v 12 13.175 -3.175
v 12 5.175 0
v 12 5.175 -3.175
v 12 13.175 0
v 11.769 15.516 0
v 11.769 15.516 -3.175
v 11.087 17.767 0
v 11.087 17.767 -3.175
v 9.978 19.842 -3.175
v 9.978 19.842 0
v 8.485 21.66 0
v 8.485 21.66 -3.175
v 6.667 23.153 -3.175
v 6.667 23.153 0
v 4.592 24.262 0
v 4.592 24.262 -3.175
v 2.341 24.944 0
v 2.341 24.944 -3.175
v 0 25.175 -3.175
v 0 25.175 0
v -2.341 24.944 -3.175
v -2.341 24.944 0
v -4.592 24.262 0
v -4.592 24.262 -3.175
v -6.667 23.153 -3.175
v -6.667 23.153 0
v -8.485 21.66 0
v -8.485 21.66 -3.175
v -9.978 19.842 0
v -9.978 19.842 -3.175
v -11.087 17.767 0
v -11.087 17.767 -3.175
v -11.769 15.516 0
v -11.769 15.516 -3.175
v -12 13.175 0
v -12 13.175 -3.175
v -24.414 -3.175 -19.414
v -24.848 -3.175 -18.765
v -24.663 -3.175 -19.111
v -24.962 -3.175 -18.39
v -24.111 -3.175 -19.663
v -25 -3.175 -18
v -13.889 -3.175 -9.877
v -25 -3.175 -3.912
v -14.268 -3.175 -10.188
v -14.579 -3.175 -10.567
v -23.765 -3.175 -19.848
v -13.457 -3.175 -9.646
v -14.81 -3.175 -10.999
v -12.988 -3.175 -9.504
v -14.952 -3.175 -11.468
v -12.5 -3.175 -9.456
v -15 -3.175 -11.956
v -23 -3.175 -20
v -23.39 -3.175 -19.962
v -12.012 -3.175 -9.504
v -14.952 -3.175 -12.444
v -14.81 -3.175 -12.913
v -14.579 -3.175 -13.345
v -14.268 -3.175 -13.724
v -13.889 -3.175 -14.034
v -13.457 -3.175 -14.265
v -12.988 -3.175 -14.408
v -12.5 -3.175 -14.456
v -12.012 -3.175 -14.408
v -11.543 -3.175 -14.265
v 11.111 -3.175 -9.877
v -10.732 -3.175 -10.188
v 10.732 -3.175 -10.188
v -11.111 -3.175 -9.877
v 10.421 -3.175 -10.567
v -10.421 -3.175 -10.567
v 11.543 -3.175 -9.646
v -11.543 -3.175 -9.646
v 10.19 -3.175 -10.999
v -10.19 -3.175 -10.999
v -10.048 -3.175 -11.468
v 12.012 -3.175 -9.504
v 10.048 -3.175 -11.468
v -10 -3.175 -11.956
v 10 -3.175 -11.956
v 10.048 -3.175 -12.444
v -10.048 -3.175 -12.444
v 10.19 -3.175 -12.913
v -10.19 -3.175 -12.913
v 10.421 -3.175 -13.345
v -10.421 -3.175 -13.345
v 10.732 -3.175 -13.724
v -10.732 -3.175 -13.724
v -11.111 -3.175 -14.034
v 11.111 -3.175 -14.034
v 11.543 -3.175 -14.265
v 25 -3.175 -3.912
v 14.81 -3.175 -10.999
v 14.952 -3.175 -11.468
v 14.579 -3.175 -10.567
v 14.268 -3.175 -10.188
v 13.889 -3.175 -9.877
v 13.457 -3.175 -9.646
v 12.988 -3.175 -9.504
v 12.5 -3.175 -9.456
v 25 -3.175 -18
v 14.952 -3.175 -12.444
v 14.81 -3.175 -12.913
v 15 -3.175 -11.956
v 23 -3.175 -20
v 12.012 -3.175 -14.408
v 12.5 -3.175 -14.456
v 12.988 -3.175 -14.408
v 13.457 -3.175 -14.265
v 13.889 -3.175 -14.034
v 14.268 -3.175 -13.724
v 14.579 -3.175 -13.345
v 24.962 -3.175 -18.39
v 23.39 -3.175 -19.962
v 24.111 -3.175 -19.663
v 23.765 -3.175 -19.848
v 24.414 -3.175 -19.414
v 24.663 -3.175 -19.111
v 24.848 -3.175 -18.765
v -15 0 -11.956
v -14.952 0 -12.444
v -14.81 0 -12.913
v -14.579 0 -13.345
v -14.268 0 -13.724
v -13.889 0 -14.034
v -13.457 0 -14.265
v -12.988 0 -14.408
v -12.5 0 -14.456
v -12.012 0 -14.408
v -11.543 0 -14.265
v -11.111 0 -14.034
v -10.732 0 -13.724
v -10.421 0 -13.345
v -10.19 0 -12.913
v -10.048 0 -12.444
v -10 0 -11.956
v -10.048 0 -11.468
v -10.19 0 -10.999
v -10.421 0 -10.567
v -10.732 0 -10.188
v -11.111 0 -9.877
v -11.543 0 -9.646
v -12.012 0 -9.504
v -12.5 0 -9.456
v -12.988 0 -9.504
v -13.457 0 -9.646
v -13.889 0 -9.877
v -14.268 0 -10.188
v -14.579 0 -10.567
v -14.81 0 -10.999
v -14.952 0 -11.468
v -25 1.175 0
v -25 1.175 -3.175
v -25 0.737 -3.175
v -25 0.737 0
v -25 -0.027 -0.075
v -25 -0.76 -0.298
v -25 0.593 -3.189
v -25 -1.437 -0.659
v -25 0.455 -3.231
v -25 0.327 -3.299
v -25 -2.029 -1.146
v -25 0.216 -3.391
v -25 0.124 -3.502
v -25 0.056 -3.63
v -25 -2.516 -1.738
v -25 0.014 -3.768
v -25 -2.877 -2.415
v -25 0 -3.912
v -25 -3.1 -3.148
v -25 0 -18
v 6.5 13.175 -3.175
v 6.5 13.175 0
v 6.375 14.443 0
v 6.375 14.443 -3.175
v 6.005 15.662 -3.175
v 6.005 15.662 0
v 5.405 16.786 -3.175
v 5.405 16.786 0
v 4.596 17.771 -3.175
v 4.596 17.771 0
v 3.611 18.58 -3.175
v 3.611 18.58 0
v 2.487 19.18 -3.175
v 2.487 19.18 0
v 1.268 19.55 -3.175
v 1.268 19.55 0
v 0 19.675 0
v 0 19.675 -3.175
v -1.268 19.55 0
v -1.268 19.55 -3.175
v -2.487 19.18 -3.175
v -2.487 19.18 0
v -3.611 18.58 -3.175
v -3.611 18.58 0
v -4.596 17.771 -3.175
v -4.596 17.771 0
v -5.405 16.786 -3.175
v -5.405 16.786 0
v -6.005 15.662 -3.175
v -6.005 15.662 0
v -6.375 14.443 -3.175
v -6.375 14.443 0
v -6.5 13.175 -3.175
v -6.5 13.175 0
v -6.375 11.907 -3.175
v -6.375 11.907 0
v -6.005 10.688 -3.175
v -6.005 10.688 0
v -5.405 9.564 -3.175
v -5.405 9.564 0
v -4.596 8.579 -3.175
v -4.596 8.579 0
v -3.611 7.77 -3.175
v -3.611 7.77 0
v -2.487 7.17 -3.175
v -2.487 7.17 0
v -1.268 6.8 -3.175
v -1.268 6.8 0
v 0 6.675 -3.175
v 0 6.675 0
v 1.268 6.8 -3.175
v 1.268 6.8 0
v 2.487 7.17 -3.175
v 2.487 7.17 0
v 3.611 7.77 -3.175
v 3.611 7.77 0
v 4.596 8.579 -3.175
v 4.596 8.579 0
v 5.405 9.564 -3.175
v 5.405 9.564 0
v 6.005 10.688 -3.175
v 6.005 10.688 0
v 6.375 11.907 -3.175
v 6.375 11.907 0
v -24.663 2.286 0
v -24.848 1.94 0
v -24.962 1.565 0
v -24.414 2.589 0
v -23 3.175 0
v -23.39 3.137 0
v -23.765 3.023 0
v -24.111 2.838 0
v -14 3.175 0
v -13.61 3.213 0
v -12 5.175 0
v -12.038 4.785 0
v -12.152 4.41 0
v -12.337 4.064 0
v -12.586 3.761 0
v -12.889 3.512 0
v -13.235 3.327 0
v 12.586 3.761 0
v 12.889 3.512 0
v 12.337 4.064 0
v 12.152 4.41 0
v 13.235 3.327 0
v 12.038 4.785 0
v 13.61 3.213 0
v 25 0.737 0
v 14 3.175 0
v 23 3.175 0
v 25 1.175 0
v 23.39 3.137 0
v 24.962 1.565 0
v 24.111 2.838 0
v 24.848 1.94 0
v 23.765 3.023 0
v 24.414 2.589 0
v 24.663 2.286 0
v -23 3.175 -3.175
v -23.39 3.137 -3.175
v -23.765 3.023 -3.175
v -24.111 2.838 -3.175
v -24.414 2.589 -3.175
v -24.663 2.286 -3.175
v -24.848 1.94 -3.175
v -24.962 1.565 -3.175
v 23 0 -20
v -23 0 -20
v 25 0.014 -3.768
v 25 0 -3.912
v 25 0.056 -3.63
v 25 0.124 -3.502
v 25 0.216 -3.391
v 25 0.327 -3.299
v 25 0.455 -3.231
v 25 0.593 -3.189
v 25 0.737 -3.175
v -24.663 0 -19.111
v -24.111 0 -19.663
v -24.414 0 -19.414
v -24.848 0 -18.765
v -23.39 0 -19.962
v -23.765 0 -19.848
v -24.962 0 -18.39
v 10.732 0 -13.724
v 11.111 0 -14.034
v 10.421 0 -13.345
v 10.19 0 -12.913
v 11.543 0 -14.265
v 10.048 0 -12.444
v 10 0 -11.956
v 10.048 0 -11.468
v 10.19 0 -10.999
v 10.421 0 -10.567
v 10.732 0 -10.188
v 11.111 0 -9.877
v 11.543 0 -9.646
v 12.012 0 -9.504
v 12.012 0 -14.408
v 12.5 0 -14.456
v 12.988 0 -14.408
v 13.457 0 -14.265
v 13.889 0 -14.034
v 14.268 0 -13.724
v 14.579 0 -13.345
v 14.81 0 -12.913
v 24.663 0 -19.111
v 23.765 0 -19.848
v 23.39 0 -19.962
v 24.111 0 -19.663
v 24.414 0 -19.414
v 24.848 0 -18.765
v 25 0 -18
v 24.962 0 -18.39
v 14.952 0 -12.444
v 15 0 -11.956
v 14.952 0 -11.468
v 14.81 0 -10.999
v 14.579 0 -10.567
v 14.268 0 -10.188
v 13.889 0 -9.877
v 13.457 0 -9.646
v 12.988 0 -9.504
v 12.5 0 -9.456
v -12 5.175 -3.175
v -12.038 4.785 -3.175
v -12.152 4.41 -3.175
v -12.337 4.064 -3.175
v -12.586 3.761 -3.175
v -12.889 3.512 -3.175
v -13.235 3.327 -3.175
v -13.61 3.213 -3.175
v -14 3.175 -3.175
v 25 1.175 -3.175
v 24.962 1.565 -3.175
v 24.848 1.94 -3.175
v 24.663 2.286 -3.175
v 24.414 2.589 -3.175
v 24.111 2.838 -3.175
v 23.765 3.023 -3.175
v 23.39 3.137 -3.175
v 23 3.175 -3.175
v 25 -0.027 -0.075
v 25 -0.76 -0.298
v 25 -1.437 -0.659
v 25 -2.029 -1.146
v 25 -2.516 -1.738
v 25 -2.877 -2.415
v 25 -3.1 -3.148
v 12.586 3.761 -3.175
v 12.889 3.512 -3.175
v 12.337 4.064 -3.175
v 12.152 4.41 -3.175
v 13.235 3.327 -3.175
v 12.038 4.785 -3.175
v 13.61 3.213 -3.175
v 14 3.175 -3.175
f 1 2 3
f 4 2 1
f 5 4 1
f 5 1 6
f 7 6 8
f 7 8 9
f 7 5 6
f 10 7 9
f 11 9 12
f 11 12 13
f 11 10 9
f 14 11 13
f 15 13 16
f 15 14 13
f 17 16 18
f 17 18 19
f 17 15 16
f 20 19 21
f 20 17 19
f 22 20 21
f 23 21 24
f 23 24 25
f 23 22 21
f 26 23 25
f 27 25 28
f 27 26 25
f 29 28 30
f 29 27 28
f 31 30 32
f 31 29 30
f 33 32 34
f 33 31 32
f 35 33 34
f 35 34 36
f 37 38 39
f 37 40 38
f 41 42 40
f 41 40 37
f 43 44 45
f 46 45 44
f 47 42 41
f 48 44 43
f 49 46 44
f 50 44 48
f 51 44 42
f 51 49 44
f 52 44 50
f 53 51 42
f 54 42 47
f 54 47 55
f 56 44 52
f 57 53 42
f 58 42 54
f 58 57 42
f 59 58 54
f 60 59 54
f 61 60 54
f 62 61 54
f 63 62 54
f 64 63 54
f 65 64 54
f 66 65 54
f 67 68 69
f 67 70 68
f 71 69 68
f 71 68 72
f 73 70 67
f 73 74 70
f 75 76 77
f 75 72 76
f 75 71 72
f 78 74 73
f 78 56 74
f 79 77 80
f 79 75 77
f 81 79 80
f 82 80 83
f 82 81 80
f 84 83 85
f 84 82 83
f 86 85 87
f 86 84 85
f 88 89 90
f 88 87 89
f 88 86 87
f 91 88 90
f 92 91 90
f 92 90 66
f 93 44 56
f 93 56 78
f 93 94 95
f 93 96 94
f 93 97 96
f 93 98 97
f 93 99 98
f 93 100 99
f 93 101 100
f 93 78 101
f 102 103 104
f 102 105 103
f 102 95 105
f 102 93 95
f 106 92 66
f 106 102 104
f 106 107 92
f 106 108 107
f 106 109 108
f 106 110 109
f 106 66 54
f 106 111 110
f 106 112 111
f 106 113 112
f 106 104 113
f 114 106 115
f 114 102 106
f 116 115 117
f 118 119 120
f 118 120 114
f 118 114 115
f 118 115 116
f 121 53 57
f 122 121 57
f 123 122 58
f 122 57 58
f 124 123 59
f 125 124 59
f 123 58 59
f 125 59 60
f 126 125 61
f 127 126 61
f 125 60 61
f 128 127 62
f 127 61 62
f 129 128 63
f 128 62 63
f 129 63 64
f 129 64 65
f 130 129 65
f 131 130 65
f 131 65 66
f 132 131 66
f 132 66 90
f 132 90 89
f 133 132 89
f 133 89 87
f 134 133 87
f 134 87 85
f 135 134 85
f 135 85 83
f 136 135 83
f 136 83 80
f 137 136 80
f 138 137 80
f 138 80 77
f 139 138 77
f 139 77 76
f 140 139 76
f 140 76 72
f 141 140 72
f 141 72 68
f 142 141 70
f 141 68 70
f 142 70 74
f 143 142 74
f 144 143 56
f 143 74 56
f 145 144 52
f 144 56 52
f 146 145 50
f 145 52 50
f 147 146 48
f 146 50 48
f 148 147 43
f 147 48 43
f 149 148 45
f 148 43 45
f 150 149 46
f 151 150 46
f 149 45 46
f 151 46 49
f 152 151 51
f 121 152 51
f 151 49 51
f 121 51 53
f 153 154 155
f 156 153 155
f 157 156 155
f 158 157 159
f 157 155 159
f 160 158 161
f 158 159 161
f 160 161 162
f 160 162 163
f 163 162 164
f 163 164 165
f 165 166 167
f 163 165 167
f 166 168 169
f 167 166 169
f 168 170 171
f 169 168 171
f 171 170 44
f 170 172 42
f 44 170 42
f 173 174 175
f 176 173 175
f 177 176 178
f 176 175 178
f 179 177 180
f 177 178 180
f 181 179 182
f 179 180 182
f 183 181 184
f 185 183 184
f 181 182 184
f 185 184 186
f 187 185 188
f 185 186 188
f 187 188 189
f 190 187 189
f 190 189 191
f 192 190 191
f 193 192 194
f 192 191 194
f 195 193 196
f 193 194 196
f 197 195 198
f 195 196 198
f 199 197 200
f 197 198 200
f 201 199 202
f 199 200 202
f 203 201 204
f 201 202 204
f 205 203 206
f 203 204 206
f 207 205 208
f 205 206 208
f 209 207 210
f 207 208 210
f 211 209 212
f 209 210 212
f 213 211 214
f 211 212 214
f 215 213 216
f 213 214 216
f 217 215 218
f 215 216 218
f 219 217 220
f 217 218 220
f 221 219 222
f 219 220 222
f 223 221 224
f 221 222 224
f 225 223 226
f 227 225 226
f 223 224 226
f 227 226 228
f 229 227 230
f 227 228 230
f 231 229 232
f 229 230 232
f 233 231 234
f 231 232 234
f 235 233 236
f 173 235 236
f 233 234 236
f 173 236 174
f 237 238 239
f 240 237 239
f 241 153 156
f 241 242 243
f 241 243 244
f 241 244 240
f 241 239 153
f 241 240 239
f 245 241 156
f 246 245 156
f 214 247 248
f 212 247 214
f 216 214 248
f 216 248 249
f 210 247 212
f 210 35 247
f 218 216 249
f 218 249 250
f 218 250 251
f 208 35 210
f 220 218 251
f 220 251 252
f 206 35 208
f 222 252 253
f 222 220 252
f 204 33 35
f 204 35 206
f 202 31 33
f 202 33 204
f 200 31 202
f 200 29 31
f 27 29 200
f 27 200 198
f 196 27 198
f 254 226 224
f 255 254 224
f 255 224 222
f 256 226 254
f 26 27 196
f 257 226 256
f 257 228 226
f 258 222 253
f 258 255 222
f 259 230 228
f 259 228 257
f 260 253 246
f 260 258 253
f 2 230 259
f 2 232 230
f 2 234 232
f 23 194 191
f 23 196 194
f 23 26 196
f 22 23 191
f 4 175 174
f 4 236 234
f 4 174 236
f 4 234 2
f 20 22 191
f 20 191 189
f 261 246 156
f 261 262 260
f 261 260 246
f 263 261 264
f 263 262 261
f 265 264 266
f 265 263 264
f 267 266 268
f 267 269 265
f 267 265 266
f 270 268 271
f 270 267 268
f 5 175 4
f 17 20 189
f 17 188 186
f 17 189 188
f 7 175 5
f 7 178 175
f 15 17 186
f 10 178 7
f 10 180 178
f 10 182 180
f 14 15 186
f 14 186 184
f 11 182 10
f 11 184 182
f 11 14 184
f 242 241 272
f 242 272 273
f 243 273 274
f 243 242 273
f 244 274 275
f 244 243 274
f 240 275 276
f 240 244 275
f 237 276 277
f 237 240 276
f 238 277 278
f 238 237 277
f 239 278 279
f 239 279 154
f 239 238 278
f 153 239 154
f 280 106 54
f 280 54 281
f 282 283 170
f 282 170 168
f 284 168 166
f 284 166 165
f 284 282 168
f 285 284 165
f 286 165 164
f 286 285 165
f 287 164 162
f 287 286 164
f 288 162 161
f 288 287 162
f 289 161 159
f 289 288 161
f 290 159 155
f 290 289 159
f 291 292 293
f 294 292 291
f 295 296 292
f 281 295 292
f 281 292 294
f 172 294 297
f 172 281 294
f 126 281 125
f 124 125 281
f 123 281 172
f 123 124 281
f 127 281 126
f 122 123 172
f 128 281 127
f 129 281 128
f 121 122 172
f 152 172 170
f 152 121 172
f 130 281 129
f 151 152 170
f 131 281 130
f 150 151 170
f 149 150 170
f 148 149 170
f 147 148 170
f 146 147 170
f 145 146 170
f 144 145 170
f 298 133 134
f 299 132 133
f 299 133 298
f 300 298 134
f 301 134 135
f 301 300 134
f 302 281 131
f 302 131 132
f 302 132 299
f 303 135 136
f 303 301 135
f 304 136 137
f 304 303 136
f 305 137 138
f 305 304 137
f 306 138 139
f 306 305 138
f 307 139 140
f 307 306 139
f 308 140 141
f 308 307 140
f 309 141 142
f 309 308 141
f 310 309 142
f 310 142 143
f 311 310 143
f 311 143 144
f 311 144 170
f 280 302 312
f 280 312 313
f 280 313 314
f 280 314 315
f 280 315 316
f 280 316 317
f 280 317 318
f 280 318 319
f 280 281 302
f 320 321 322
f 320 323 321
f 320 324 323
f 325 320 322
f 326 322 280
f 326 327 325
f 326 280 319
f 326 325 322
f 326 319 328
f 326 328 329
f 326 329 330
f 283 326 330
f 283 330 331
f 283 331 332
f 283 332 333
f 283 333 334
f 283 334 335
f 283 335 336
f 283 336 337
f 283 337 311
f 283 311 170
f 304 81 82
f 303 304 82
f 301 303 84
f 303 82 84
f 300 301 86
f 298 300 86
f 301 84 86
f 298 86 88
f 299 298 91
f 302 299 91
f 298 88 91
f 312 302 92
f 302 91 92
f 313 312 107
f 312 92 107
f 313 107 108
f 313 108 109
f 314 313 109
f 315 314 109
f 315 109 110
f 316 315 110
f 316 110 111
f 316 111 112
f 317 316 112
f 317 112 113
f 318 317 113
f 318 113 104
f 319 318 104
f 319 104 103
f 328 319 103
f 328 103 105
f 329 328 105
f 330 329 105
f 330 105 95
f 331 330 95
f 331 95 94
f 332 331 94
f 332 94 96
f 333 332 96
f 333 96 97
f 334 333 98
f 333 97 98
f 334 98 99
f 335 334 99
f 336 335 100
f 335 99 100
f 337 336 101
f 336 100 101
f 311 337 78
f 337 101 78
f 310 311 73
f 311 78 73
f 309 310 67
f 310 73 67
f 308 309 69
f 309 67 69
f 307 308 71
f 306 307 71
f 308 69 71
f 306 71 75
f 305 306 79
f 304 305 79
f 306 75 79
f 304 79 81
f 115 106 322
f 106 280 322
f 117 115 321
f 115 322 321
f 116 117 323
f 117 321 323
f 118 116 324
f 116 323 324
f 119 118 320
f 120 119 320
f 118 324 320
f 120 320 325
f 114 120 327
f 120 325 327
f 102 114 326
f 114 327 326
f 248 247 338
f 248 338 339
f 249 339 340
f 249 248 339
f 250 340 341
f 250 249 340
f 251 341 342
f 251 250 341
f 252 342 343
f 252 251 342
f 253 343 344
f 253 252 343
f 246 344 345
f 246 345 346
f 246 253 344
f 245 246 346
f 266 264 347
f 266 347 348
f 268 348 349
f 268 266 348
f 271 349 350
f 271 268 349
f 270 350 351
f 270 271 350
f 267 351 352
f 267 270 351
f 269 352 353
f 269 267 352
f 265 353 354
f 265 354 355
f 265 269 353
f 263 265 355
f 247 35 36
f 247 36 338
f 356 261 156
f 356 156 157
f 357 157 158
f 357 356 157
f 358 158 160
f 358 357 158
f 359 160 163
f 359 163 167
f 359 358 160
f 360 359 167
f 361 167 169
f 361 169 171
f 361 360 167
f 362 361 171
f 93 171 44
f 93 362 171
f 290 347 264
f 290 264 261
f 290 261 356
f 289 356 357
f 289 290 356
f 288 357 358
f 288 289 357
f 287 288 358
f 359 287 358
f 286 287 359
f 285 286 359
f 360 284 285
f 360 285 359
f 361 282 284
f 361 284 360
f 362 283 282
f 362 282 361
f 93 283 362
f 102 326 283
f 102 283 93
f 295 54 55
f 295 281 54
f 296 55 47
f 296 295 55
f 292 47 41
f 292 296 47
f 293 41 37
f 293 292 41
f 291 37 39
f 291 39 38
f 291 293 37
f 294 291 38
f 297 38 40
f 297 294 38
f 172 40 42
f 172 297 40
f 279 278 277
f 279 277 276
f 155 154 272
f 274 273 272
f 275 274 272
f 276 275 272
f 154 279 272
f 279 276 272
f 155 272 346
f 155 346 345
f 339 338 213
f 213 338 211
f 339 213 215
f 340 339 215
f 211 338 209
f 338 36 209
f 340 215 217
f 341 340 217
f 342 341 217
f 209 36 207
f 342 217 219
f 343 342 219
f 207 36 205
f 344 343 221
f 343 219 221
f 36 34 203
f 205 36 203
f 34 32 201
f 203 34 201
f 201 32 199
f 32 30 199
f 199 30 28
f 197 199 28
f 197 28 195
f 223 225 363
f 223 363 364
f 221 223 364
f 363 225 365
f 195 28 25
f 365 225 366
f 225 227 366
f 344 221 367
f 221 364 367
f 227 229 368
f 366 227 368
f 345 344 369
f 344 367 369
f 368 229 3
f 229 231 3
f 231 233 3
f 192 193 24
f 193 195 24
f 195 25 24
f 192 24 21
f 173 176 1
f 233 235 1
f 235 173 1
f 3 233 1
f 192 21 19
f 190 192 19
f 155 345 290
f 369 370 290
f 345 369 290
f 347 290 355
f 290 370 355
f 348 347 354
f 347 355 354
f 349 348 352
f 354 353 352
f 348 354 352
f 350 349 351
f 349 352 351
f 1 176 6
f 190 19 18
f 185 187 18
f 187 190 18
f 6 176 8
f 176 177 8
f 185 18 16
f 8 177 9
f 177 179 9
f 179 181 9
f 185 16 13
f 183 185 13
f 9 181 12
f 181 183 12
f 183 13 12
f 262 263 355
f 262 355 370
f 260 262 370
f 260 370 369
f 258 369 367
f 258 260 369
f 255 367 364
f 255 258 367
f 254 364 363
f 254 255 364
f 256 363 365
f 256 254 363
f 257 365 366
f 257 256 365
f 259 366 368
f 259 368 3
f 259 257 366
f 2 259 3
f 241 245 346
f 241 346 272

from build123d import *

# Parameters (mm, degrees)
SKETCH1_R                    = 6.5
BASE_FLANGE1_DEPTH           = 3.175
EDGE_FLANGE1_STRIP_W         = 14.1732
EDGE_FLANGE1_STRIP_H         = 3.175
EDGE_FLANGE1_STRIP_CUT_DEPTH = 50
EDGE_FLANGE1_DEPTH           = 50
FILLET2_R                    = 2
F_5_0MM_DOWEL_HOLE1_D        = 5


# Sheet-metal steps are written as plain solids
with BuildPart() as part:
    # Sketch1 → Base-Flange1 (new body)
    with BuildSketch(Plane.XY):
        with BuildLine():
            Line((-25, 0), (25, 0))
            Line((25, 0), (25, 1.175))
            ThreePointArc((25, 1.175), (24.414213562, 2.589213562), (23, 3.175))
            Line((23, 3.175), (14, 3.175))
            ThreePointArc((14, 3.175), (12.585786438, 3.760786438), (12, 5.175))
            Line((12, 5.175), (12, 13.175))
            ThreePointArc((12, 13.175), (0, 25.175), (-12, 13.175))
            Line((-12, 13.175), (-12, 5.175))
            ThreePointArc((-12, 5.175), (-12.585786438, 3.760786438), (-14, 3.175))
            Line((-14, 3.175), (-23, 3.175))
            ThreePointArc((-23, 3.175), (-24.414213562, 2.589213562), (-25, 1.175))
            Line((-25, 1.175), (-25, 0))
        make_face()
        with Locations((0, 13.175)):
            Circle(SKETCH1_R, mode=Mode.SUBTRACT)
    extrude(amount=-BASE_FLANGE1_DEPTH)

    # Edge-Flange1 strip (across the edge) → Edge-Flange1 strip cut (cut)
    with BuildSketch(Plane(origin=(25, 0, -3.175), x_dir=(0, 1, 0), z_dir=(-1, 0, 0))):
        with Locations((-6.35, -1.5875)):
            Rectangle(EDGE_FLANGE1_STRIP_W, EDGE_FLANGE1_STRIP_H)
    extrude(amount=EDGE_FLANGE1_STRIP_CUT_DEPTH, mode=Mode.SUBTRACT)

    # Edge-Flange1 section (across the edge) → Edge-Flange1 (add)
    with BuildSketch(Plane(origin=(25, 0, -3.175), x_dir=(0, 1, 0), z_dir=(-1, 0, 0))):
        with BuildLine():
            Line((-3.175, 0.7366), (-3.175, 16.825))
            Line((-3.175, 16.825), (0, 16.825))
            Line((0, 16.825), (0, 0.7366))
            ThreePointArc((0, 0.7366), (0.215745145, 0.215745145), (0.7366, 0))
            Line((0.7366, 0), (0.7366, -3.175))
            ThreePointArc((0.7366, -3.175), (-2.029318885, -2.029318885), (-3.175, 0.7366))
        make_face()
    extrude(amount=EDGE_FLANGE1_DEPTH)

    # Fillet2
    fillet2_edges = [part.edges().sort_by_distance(p)[0] for p in [
        (25, -1.5875, -20),
        (-25, -1.5875, -20),
    ]]
    fillet(fillet2_edges, radius=FILLET2_R)

    # Ø5.0mm Dowel Hole1 (through all)
    with Locations(Plane(origin=(0, 0, 0), x_dir=(1, 0, 0), z_dir=(0, 1, 0))):
        with Locations((-12.5, 11.9558), (12.5, 11.9558)):
            Hole(F_5_0MM_DOWEL_HOLE1_D / 2)


solid = part.part
